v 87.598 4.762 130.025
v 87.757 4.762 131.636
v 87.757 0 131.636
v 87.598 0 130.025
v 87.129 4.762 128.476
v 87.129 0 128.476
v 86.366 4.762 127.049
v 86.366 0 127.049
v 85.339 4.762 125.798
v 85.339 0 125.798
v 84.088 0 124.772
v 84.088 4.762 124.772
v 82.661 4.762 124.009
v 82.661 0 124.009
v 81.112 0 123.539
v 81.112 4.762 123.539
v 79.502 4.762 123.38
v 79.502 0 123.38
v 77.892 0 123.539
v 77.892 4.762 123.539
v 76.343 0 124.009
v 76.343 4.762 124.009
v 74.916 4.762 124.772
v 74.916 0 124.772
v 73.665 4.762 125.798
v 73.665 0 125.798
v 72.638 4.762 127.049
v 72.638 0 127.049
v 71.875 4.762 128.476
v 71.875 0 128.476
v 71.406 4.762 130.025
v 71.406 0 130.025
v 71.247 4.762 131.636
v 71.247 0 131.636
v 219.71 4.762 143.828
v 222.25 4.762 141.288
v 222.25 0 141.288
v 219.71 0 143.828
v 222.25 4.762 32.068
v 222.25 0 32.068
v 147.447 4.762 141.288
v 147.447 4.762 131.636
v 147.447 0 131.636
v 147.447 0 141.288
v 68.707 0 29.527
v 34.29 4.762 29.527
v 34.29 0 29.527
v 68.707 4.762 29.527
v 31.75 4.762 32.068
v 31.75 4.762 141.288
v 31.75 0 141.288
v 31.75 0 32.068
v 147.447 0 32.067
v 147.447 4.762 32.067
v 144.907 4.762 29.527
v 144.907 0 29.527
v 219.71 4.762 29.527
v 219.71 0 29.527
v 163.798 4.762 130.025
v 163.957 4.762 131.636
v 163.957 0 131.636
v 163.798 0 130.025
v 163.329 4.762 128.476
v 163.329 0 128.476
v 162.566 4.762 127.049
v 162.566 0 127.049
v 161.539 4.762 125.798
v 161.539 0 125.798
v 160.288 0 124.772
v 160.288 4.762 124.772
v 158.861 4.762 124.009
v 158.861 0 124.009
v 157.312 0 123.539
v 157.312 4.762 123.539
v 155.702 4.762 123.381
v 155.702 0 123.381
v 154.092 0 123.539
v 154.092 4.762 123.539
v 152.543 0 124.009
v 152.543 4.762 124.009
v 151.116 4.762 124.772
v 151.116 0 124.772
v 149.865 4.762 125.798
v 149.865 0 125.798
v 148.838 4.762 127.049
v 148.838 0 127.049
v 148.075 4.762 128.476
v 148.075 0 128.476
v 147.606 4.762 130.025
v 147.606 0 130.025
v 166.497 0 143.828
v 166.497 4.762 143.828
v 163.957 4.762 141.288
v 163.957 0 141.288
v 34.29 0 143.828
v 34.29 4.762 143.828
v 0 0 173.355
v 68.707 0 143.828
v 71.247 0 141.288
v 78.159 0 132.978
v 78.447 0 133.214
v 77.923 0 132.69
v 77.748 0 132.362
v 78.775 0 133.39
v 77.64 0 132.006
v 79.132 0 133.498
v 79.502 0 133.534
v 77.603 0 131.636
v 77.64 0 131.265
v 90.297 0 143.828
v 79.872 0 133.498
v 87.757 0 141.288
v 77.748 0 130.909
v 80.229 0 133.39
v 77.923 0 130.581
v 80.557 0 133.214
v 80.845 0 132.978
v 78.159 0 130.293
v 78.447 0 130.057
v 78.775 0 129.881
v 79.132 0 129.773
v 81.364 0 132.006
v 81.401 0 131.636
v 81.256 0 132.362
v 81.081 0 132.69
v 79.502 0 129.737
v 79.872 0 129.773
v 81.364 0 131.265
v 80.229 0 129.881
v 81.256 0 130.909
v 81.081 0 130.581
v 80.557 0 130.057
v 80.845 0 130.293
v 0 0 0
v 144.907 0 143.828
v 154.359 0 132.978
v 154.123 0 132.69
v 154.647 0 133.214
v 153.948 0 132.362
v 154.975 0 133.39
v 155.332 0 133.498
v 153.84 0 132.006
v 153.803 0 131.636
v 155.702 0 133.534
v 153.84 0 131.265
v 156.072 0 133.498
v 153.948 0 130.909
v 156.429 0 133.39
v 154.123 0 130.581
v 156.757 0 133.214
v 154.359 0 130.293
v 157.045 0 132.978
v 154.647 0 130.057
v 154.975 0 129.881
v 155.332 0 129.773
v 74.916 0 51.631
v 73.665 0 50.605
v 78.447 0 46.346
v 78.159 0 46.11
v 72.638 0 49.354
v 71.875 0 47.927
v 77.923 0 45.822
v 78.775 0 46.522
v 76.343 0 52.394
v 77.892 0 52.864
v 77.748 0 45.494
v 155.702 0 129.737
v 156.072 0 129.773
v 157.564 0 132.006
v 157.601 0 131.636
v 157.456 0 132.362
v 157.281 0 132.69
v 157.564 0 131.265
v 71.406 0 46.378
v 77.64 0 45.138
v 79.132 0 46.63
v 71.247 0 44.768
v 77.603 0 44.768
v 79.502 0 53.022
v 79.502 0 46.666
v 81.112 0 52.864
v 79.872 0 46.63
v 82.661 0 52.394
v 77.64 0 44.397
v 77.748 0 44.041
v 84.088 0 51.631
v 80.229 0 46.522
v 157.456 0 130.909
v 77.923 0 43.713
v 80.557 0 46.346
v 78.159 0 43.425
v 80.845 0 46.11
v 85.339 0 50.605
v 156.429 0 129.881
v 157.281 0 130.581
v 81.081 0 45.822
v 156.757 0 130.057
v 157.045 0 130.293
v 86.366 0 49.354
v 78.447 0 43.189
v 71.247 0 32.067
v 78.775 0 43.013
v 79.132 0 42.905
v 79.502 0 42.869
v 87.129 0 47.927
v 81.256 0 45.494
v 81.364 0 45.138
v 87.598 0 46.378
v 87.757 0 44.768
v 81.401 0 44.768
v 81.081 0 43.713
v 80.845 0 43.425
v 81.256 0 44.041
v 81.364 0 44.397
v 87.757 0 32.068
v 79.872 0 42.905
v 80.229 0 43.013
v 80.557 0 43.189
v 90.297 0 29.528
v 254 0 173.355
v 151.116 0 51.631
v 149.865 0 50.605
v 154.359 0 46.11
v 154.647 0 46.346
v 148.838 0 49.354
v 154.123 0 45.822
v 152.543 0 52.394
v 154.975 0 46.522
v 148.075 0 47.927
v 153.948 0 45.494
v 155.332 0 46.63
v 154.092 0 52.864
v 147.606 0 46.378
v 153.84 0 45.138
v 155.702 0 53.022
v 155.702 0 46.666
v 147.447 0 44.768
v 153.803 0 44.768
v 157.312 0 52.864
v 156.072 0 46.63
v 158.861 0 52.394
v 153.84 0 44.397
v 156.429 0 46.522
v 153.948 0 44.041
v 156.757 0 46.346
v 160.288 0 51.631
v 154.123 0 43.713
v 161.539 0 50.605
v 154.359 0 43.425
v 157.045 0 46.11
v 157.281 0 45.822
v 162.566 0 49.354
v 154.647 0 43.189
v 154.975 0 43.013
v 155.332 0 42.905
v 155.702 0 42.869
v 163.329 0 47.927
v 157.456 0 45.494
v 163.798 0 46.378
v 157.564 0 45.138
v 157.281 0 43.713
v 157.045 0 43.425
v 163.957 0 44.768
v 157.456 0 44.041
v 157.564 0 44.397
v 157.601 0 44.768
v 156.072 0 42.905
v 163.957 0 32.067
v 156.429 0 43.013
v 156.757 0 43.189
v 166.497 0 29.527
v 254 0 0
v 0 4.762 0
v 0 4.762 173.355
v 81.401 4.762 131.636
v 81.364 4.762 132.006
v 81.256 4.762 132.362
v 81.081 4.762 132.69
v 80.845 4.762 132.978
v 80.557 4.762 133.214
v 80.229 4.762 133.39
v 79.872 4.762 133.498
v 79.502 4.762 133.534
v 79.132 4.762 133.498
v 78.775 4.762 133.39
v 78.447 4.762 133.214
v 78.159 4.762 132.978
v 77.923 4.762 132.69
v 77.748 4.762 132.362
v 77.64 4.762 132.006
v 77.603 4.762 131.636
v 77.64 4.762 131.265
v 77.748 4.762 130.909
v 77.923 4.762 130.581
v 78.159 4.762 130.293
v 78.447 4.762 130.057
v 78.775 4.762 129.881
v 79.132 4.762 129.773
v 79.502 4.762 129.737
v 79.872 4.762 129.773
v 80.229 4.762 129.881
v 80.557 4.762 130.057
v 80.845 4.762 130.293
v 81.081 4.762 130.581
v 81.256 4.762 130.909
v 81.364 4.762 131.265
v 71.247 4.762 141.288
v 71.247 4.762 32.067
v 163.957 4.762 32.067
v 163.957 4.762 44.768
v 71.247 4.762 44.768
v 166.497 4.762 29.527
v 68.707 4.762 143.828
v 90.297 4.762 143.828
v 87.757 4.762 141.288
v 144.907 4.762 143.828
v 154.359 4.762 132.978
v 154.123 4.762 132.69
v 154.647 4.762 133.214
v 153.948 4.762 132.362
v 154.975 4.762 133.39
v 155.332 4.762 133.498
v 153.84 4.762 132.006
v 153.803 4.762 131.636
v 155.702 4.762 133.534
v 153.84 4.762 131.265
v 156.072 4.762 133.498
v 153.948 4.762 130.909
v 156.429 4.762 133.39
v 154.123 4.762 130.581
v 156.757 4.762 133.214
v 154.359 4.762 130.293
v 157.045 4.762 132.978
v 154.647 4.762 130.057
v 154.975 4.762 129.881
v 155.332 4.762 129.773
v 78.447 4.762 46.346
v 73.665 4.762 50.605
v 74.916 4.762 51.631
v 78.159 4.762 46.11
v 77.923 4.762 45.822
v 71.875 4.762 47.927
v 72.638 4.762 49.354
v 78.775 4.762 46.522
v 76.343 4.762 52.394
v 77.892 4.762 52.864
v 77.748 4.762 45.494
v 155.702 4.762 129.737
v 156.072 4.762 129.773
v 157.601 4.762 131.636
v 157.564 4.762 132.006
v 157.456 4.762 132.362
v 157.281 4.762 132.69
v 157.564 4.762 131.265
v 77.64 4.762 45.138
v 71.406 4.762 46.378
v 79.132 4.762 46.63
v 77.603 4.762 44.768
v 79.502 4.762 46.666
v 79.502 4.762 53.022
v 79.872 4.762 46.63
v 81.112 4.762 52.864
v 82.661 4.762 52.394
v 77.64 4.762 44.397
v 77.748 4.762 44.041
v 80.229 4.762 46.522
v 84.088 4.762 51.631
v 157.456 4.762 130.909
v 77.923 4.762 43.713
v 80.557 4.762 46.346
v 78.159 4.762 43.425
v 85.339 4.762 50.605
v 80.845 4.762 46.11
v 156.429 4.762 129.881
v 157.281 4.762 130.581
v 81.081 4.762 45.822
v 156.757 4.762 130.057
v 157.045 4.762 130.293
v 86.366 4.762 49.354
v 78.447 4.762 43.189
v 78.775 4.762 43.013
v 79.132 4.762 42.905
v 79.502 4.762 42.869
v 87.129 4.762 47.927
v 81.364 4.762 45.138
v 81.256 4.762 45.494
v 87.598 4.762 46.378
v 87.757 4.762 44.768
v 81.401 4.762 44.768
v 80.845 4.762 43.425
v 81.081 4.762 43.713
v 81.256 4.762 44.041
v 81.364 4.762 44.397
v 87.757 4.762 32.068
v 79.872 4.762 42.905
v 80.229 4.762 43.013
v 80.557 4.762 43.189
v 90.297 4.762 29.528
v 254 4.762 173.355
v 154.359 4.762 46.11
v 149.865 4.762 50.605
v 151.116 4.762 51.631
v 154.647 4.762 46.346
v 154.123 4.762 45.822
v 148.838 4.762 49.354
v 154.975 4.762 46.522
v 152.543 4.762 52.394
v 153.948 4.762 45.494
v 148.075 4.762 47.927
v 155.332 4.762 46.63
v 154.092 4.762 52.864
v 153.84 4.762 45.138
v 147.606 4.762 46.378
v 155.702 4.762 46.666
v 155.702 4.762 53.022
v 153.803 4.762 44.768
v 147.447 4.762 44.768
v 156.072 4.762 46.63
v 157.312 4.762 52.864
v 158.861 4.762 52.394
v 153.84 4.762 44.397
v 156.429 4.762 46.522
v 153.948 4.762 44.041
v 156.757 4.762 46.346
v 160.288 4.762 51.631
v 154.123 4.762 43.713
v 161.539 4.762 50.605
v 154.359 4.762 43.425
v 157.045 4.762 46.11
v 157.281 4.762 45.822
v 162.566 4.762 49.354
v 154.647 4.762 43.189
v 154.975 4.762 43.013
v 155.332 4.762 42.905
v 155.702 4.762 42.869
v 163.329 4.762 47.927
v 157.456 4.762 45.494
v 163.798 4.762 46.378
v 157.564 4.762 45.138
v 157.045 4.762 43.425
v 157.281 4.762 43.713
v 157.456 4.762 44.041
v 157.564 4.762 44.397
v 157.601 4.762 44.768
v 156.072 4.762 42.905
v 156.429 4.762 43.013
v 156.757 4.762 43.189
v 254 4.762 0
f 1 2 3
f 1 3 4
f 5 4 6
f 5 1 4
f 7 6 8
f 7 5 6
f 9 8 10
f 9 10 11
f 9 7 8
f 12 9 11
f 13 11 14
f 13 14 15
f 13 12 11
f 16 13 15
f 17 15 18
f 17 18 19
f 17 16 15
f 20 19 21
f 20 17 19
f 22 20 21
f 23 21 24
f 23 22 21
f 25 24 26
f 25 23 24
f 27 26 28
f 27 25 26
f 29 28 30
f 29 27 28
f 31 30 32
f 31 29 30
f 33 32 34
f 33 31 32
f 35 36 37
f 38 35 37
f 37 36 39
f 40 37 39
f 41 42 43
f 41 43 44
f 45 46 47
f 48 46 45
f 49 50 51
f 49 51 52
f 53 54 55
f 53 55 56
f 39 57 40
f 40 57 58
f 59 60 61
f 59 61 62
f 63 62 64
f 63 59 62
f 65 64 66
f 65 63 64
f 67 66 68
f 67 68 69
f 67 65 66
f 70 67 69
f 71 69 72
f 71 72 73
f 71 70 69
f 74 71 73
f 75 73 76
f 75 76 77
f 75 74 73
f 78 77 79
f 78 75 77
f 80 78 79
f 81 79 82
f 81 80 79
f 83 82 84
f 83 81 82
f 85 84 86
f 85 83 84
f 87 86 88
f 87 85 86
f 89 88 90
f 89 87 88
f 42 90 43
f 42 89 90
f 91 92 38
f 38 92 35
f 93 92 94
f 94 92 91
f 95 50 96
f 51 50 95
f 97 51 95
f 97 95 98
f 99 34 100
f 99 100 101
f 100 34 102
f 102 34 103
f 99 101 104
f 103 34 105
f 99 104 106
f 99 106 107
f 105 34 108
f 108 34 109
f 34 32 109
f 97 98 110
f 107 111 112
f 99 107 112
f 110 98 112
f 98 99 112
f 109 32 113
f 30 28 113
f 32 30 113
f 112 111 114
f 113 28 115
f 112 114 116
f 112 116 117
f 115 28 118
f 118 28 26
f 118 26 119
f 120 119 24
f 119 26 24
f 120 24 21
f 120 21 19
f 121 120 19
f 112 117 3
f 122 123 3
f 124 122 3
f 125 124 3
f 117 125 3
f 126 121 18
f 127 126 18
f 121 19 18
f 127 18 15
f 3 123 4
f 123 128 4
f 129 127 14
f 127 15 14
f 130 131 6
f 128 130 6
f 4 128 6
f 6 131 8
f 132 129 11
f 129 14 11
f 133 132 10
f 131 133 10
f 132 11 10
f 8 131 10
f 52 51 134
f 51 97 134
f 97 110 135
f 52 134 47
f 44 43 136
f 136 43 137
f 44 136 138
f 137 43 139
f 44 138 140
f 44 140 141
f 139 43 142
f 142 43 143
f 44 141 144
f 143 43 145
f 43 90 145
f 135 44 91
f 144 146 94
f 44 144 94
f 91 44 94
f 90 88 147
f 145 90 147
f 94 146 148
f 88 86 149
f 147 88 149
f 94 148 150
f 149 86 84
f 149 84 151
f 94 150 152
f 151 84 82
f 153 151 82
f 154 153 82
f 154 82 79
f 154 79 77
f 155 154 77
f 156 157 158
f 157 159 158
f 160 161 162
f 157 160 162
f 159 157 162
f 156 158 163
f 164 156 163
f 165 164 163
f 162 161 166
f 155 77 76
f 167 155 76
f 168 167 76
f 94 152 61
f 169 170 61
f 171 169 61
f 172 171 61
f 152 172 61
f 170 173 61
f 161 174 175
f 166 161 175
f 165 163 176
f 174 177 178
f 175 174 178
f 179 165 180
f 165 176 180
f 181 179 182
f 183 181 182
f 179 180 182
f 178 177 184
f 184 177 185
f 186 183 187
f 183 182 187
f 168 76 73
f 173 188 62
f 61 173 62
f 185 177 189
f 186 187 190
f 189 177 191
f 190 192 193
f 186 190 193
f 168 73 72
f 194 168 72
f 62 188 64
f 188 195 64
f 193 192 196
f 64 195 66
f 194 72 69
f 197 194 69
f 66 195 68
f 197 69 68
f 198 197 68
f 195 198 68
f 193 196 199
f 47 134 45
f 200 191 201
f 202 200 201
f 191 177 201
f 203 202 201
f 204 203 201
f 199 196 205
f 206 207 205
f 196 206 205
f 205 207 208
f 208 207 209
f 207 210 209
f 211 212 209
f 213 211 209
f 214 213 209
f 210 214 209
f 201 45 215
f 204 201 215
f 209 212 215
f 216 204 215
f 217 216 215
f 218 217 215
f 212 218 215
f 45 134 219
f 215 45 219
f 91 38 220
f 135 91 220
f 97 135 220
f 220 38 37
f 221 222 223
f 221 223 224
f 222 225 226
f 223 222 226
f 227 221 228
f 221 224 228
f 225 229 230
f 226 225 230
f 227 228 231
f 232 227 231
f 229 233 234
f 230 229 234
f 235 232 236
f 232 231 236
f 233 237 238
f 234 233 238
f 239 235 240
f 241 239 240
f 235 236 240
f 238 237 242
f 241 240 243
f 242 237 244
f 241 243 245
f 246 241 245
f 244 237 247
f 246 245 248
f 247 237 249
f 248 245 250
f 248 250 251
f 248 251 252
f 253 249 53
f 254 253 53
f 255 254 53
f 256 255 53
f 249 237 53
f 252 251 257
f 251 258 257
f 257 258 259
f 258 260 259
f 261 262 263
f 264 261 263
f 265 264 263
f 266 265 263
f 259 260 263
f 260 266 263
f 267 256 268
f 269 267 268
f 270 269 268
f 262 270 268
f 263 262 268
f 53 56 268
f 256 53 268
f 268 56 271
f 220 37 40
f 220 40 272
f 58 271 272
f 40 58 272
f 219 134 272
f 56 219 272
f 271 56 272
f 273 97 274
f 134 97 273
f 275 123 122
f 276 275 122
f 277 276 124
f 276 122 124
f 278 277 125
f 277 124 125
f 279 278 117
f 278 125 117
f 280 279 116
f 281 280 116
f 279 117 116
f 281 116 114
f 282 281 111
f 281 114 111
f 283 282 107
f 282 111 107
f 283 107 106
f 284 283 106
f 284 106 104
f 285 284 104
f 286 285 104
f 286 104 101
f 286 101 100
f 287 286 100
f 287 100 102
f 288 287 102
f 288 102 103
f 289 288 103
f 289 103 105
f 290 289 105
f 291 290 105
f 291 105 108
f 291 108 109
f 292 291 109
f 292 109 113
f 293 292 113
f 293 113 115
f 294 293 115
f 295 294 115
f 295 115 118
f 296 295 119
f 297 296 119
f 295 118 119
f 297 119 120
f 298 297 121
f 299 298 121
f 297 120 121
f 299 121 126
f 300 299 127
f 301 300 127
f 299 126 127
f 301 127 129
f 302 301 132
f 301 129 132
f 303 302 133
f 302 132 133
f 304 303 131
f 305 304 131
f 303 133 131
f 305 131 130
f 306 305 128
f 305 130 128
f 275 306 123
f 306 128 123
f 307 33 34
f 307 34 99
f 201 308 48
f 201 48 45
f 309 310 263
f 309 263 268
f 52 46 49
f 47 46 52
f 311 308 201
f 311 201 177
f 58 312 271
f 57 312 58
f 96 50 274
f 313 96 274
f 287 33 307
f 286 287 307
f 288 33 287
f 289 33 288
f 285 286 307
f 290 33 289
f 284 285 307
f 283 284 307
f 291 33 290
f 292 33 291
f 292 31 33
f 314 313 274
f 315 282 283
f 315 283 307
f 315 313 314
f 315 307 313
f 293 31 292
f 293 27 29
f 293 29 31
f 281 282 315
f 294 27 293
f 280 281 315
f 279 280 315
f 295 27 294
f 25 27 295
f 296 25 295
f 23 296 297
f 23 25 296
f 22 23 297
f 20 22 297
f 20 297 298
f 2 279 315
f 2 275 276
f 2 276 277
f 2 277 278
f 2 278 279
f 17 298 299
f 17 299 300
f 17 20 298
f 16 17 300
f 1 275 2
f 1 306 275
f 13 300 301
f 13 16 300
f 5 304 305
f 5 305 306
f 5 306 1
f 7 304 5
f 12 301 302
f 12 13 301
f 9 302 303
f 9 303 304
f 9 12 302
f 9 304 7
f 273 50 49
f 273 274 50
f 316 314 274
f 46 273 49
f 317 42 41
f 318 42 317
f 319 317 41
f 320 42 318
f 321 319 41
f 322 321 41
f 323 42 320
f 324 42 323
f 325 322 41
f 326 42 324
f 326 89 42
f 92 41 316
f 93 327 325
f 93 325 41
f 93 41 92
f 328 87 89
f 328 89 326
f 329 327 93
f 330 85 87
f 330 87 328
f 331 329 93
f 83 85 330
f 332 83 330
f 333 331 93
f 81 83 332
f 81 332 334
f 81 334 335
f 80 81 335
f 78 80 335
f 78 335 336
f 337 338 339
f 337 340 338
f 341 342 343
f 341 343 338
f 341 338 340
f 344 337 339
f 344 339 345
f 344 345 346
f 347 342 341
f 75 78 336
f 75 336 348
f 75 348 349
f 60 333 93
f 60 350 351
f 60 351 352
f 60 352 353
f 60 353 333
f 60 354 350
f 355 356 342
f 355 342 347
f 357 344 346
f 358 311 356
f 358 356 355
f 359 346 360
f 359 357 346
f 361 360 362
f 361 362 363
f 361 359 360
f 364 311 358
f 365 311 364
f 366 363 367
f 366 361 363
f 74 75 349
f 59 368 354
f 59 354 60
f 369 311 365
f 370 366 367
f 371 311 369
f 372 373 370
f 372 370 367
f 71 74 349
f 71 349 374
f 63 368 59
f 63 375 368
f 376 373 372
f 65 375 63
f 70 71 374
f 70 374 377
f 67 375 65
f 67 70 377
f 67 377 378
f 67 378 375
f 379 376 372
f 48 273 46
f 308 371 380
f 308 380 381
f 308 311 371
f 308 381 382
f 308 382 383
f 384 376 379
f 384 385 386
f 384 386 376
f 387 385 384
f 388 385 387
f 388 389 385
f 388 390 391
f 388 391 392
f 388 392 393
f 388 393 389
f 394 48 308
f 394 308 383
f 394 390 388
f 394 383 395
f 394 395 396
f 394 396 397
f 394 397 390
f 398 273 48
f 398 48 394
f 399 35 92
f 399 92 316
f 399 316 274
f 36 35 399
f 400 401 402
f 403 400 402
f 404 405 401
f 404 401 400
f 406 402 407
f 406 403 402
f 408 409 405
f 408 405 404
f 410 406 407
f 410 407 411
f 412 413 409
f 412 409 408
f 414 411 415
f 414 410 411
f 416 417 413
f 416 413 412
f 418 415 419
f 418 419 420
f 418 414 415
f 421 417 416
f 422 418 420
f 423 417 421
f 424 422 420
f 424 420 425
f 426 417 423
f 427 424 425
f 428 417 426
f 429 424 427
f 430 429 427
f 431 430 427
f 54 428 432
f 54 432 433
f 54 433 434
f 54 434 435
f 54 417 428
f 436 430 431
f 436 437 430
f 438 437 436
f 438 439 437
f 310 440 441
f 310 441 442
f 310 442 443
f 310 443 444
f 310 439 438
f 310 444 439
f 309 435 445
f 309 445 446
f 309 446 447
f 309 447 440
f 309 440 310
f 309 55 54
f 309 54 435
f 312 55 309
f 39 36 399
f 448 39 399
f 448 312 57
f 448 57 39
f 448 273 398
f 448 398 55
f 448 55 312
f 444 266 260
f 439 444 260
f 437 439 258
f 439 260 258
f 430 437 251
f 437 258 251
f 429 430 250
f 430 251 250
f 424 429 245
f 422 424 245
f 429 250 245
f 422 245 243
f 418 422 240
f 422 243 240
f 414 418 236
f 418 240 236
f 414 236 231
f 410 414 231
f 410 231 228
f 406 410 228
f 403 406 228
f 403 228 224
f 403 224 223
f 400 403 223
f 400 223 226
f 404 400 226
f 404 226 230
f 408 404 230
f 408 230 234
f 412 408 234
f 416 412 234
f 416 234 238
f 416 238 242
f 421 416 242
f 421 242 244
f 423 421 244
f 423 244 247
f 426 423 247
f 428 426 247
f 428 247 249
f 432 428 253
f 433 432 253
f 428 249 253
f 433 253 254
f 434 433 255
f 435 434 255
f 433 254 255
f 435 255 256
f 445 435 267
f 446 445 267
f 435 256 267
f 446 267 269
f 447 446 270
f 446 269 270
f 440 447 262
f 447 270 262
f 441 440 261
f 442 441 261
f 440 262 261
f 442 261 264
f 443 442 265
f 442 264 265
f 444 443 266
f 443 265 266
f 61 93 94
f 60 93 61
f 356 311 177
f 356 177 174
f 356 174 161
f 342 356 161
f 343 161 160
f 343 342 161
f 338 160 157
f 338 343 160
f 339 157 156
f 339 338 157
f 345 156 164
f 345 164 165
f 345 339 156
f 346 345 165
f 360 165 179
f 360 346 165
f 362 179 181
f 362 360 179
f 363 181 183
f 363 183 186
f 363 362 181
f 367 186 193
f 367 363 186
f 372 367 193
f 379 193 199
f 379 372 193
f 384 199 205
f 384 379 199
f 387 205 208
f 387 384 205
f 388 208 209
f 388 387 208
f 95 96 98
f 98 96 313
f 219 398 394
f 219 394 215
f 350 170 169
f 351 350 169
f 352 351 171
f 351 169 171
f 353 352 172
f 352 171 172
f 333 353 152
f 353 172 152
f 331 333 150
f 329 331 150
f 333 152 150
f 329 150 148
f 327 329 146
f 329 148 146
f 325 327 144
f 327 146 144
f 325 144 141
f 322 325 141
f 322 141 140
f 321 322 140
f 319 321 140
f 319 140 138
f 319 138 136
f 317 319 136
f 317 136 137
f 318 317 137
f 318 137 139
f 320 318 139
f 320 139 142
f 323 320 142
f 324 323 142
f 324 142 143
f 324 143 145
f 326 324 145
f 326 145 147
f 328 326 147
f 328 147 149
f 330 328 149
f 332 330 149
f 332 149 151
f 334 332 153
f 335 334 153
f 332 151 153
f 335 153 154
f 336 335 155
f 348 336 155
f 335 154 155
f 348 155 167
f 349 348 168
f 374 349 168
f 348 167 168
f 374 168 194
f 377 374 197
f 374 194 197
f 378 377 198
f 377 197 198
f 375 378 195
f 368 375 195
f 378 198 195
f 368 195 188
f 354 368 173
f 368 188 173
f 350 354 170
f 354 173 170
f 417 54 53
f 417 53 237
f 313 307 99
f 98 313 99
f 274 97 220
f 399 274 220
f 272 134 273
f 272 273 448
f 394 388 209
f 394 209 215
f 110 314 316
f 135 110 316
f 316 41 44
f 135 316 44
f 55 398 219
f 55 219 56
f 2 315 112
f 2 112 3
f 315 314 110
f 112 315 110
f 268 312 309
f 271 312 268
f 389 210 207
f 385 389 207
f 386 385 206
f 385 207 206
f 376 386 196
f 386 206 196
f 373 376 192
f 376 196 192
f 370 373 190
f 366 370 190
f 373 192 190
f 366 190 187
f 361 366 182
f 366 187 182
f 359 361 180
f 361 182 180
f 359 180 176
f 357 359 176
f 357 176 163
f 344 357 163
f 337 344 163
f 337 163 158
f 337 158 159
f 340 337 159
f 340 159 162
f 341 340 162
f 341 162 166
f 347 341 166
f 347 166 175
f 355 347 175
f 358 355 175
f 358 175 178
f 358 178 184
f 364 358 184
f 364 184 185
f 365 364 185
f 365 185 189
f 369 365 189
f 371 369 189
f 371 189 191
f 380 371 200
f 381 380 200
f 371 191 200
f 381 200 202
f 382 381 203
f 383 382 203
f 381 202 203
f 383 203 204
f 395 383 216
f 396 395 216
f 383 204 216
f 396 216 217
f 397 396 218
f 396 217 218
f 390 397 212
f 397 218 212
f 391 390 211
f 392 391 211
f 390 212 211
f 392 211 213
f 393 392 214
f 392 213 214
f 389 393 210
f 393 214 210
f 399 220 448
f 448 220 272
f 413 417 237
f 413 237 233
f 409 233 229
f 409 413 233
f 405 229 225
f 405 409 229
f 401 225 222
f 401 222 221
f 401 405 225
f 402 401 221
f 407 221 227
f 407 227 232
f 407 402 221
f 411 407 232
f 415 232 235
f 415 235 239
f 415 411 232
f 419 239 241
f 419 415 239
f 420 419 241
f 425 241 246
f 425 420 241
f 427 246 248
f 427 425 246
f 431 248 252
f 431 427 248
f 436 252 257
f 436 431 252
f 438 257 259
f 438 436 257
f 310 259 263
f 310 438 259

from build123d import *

# Parameters (mm, degrees)
SKETCH1_W                 = 254
SKETCH1_H                 = 173.355
BOSS_EXTRUDE1_DEPTH       = 4.7625
SKETCH2_W                 = 190.5
SKETCH2_H                 = 114.3
CUT_EXTRUDE1_DEPTH        = 4.7625
BOSS_EXTRUDE2_DEPTH       = 4.7625
F_6_CLEARANCE_HOLE1_D     = 3.7973
F_6_CLEARANCE_HOLE1_DEPTH = 25.4
F_6_CLEARANCE_HOLE1_TIP   = 1.140824014
CHAMFER1_SIZE             = 2.54


with BuildPart() as part:
    # Sketch1 → Boss-Extrude1 (new body)
    with BuildSketch(Plane(origin=(0, 0, 0), x_dir=(1, 0, 0), z_dir=(0, 1, 0))):
        with Locations((127, -86.6775)):
            Rectangle(SKETCH1_W, SKETCH1_H)
    extrude(amount=BOSS_EXTRUDE1_DEPTH)

    # Sketch2 → Cut-Extrude1 (cut)
    with BuildSketch(Plane(origin=(0, 4.7625, 0), x_dir=(1, 0, 0), z_dir=(0, 1, 0))):
        with Locations((127, -86.6775)):
            Rectangle(SKETCH2_W, SKETCH2_H)
    extrude(amount=-CUT_EXTRUDE1_DEPTH, mode=Mode.SUBTRACT)

    # Sketch3 → Boss-Extrude2 (add)
    with BuildSketch(Plane(origin=(0, 4.7625, 0), x_dir=(1, 0, 0), z_dir=(0, 1, 0))):
        with BuildLine():
            Line((163.957, -29.5275), (147.447, -29.5275))
            Line((147.447, -29.5275), (147.447, -44.7675))
            ThreePointArc((147.447, -44.7675), (155.702, -53.0225), (163.957, -44.7675))
            Line((163.957, -44.7675), (163.957, -29.5275))
        make_face()
        with BuildLine():
            Line((71.247, -29.5275), (71.247, -44.7675))
            ThreePointArc((71.247, -44.7675), (79.502, -53.0225), (87.757, -44.7675))
            Line((87.757, -44.7675), (87.757, -29.5275))
            Line((87.757, -29.5275), (71.247, -29.5275))
        make_face()
        with BuildLine():
            Line((71.247, -143.8275), (87.757, -143.8275))
            Line((87.757, -143.8275), (87.757, -131.6355))
            ThreePointArc((87.757, -131.6355), (79.502, -123.3805), (71.247, -131.6355))
            Line((71.247, -131.6355), (71.247, -143.8275))
        make_face()
        with BuildLine():
            Line((147.447, -131.6355), (147.447, -143.8275))
            Line((147.447, -143.8275), (163.957, -143.8275))
            Line((163.957, -143.8275), (163.957, -131.6355))
            ThreePointArc((163.957, -131.6355), (155.702, -123.3805), (147.447, -131.6355))
        make_face()
    extrude(amount=-BOSS_EXTRUDE2_DEPTH)

    # #6 Clearance Hole1
    with Locations(Plane(origin=(0, 4.7625, 0), x_dir=(-1, 0, 0), z_dir=(0, 1, 0))):
        with Locations((-79.502, 44.7675), (-155.702, 44.7675), (-79.502, 131.6355), (-155.702, 131.6355)):
            Hole(F_6_CLEARANCE_HOLE1_D / 2, depth=F_6_CLEARANCE_HOLE1_DEPTH)
            with Locations((0, 0, -(F_6_CLEARANCE_HOLE1_DEPTH + F_6_CLEARANCE_HOLE1_TIP / 2))):  # 118° drill point
                Cone(0, F_6_CLEARANCE_HOLE1_D / 2, F_6_CLEARANCE_HOLE1_TIP, mode=Mode.SUBTRACT)

    # Chamfer1
    chamfer1_edges = [part.edges().sort_by_distance(p)[0] for p in [
        (31.75, 2.38125, 143.8275),
        (31.75, 2.38125, 29.5275),
        (222.25, 2.38125, 29.5275),
        (222.25, 2.38125, 143.8275),
        (147.447, 2.38125, 29.5275),
        (163.957, 2.38125, 29.5275),
        (71.247, 2.38125, 29.5275),
        (87.757, 2.38125, 29.5275),
        (87.757, 2.38125, 143.8275),
        (71.247, 2.38125, 143.8275),
        (163.957, 2.38125, 143.8275),
        (147.447, 2.38125, 143.8275),
    ]]
    chamfer(chamfer1_edges, length=CHAMFER1_SIZE)


solid = part.part
